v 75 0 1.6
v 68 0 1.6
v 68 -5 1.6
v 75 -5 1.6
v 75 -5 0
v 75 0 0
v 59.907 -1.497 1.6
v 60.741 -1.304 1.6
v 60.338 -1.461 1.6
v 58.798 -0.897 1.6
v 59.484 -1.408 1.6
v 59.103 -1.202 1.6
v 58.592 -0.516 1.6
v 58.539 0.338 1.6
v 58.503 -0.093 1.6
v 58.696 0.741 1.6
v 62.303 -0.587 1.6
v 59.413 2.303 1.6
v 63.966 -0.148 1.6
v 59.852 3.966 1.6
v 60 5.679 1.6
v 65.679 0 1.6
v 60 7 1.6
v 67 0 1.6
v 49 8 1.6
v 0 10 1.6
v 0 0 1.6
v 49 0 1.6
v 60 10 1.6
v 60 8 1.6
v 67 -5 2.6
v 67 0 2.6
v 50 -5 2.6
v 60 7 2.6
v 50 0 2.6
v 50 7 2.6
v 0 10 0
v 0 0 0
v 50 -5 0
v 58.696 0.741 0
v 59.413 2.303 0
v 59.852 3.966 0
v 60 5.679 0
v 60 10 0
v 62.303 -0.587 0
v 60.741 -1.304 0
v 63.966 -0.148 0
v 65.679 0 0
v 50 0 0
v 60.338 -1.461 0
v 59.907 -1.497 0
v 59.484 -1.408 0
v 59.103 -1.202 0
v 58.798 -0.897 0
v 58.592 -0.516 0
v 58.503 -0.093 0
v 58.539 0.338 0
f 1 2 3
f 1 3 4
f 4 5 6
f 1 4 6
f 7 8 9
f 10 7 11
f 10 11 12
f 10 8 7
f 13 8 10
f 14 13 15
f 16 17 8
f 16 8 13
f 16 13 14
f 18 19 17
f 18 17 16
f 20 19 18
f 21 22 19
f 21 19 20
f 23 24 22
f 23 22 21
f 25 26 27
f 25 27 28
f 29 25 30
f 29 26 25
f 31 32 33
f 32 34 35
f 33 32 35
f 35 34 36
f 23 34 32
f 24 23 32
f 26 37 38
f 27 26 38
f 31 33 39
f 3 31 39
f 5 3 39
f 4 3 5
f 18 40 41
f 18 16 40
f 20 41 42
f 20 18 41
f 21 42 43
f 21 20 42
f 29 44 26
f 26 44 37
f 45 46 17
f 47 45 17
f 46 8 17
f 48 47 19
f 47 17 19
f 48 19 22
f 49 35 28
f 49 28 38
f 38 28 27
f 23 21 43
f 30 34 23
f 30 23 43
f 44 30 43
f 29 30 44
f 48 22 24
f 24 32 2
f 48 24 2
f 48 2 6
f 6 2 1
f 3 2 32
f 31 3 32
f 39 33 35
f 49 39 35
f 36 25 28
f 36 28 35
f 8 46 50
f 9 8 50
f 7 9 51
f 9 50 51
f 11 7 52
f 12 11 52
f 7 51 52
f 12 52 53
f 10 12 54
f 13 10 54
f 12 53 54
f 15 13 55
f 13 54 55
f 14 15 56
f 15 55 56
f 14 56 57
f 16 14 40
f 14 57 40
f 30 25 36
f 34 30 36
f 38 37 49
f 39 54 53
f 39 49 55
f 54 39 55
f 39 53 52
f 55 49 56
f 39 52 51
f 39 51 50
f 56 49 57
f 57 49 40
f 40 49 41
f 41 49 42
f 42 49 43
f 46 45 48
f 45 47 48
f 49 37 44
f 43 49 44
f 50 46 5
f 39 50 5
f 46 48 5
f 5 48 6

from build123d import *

# Parameters (mm, degrees)
RESSALTO_EXTRUS_O1_DEPTH = 1.6
RESSALTO_EXTRUS_O2_DEPTH = 1
CHANFRO1_SIZE            = 1
FILETE1_R                = 10


with BuildPart() as part:
    # Esboço1 → Ressalto-extrusão1 (new body)
    with BuildSketch(Plane.XY):
        with BuildLine():
            Line((0, 0), (50, 0))
            Line((50, 0), (50, -5))
            Line((50, -5), (75, -5))
            Line((75, -5), (75, 0))
            Line((75, 0), (61.5, 0))
            ThreePointArc((61.5, 0), (58.939339828, -1.060660172), (60, 1.5))
            Line((60, 1.5), (60, 10))
            Line((60, 10), (0, 10))
            Line((0, 10), (0, 0))
        make_face()
    extrude(amount=RESSALTO_EXTRUS_O1_DEPTH)

    # Esboço2 → Ressalto-extrusão2 (add)
    with BuildSketch(Plane.XY.offset(1.6)):
        Polygon((60, 7), (67, 0), (67, -5), (50, -5), (50, 7), align=None)
    extrude(amount=RESSALTO_EXTRUS_O2_DEPTH)

    # Chanfro1
    # the kernel refuses this chamfer: 1 mm, written as the material it adds along each edge
    with BuildSketch(Plane(origin=(50, 7, 1.6), x_dir=(0, 0.9996219169112968, -0.02749587661058627), z_dir=(1, 0, 0))) as chanfro1_piece_1_section:
        Polygon((CHANFRO1_SIZE * 0.999621916911, CHANFRO1_SIZE * 0.0274958766106), (-CHANFRO1_SIZE * 0.0274958766106, CHANFRO1_SIZE * 0.999621916911), (0, 0), align=None)
    chanfro1_piece_1 = extrude(amount=10, mode=Mode.PRIVATE)
    chanfro1_piece_1 = split(chanfro1_piece_1, bisect_by=Plane(origin=(57.256943657, 9.743056343, 1.932086514), z_dir=(-0.7071067811865478, -0.7071067811865474, 0)), keep=Keep.TOP, mode=Mode.PRIVATE)
    chanfro1_piece_1 = split(chanfro1_piece_1, bisect_by=Plane(origin=(54.837757031, 7.323869717, 2.6), z_dir=(0, 0, -1)), keep=Keep.TOP, mode=Mode.PRIVATE)
    add(chanfro1_piece_1)
    with BuildSketch(Plane(origin=(50, 7, 1.6), x_dir=(0, 0.9996219169112968, -0.02749587661058627), z_dir=(1, 0, 0))) as chanfro1_piece_2_section:
        Polygon((CHANFRO1_SIZE * 0.999621916911, CHANFRO1_SIZE * 0.0274958766106), (-CHANFRO1_SIZE * 0.0274958766106, CHANFRO1_SIZE * 0.999621916911), (0, 0), align=None)
    chanfro1_piece_2 = extrude(amount=10, mode=Mode.PRIVATE)
    chanfro1_piece_2 = split(chanfro1_piece_2, bisect_by=Plane(origin=(59.609036426, 7.390963574, 1.827791028), z_dir=(0.7071067811865478, 0.7071067811865474, 0)), keep=Keep.TOP, mode=Mode.PRIVATE)
    add(chanfro1_piece_2)
    with BuildSketch(Plane(origin=(50, 0, 1.6), x_dir=(-0.9996219169112968, 0, -0.0274958766105862), z_dir=(0, 1, 0))) as chanfro1_piece_3_section:
        Polygon((CHANFRO1_SIZE * 0.999621916911, CHANFRO1_SIZE * 0.0274958766106), (-CHANFRO1_SIZE * 0.0274958766106, CHANFRO1_SIZE * 0.999621916911), (0, 0), align=None)
    chanfro1_piece_3 = extrude(amount=7, mode=Mode.PRIVATE)
    chanfro1_piece_3 = split(chanfro1_piece_3, bisect_by=Plane(origin=(49.669595846, 3.5, 2.6), z_dir=(0, 0, -1)), keep=Keep.TOP, mode=Mode.PRIVATE)
    add(chanfro1_piece_3)
    with BuildSketch(Plane(origin=(67, 0, 1.6), x_dir=(0.9996219169112968, 0, -0.02749587661058639), z_dir=(0, -1, 0))) as chanfro1_piece_4_section:
        Polygon((CHANFRO1_SIZE * 0.999621916911, CHANFRO1_SIZE * 0.0274958766106), (-CHANFRO1_SIZE * 0.0274958766106, CHANFRO1_SIZE * 0.999621916911), (0, 0), align=None)
    chanfro1_piece_4 = extrude(amount=5, mode=Mode.PRIVATE)
    chanfro1_piece_4 = split(chanfro1_piece_4, bisect_by=Plane(origin=(67.390963574, -0.390963574, 1.827791028), z_dir=(0.7071067811865478, 0.7071067811865474, 0)), keep=Keep.TOP, mode=Mode.PRIVATE)
    add(chanfro1_piece_4)
    with BuildSketch(Plane(origin=(67, 0, 1.6), x_dir=(0.9996219169112968, 0, -0.02749587661058639), z_dir=(0, -1, 0))) as chanfro1_piece_5_section:
        Polygon((CHANFRO1_SIZE * 0.999621916911, CHANFRO1_SIZE * 0.0274958766106), (-CHANFRO1_SIZE * 0.0274958766106, CHANFRO1_SIZE * 0.999621916911), (0, 0), align=None)
    chanfro1_piece_5 = extrude(amount=5, mode=Mode.PRIVATE)
    chanfro1_piece_5 = split(chanfro1_piece_5, bisect_by=Plane(origin=(67.316872032, -2.658755048, 2.6), z_dir=(0, 0, -1)), keep=Keep.TOP, mode=Mode.PRIVATE)
    chanfro1_piece_5 = split(chanfro1_piece_5, bisect_by=Plane(origin=(68.48781354, -1.48781354, 1.93578343), z_dir=(-0.7071067811865478, -0.7071067811865474, 0)), keep=Keep.TOP, mode=Mode.PRIVATE)
    add(chanfro1_piece_5)
    with BuildSketch(Plane(origin=(47.428317012, 7, 1.6), x_dir=(0, 0.9996219169112968, -0.02749587661058627), z_dir=(1, 0, 0))) as chanfro1_piece_6a_section:
        Polygon((CHANFRO1_SIZE * 0.999621916911, CHANFRO1_SIZE * 0.0274958766106), (-CHANFRO1_SIZE * 0.0274958766106, CHANFRO1_SIZE * 0.999621916911), (0, 0), align=None)
    chanfro1_piece_6a = extrude(amount=12.571682988, mode=Mode.PRIVATE)
    chanfro1_piece_6a = split(chanfro1_piece_6a, bisect_by=Plane(origin=(50, 7.330404154, 1.928634334), z_dir=(-1, 0, 0)), keep=Keep.TOP, mode=Mode.PRIVATE)
    chanfro1_piece_6a = split(chanfro1_piece_6a, bisect_by=Plane(origin=(48.714158506, 7.330404154, 2.6), z_dir=(0, 0, -1)), keep=Keep.TOP, mode=Mode.PRIVATE)
    with BuildSketch(Plane(origin=(50, 0, 1.6), x_dir=(-0.9996219169112968, 0, -0.0274958766105862), z_dir=(0, 1, 0))) as chanfro1_piece_6b_section:
        Polygon((CHANFRO1_SIZE * 0.999621916911, CHANFRO1_SIZE * 0.0274958766106), (-CHANFRO1_SIZE * 0.0274958766106, CHANFRO1_SIZE * 0.999621916911), (0, 0), align=None)
    chanfro1_piece_6b = extrude(amount=9.571682988, mode=Mode.PRIVATE)
    chanfro1_piece_6b = split(chanfro1_piece_6b, bisect_by=Plane(origin=(49.669595846, 7, 1.928634334), z_dir=(0, 1, 0)), keep=Keep.TOP, mode=Mode.PRIVATE)
    chanfro1_piece_6b = split(chanfro1_piece_6b, bisect_by=Plane(origin=(49.669595846, 8.285841494, 2.6), z_dir=(0, 0, -1)), keep=Keep.TOP, mode=Mode.PRIVATE)
    chanfro1_piece_6 = chanfro1_piece_6a & chanfro1_piece_6b
    add(chanfro1_piece_6)

    # Filete1
    filete1_edges = [part.edges().sort_by_distance(p)[0] for p in [
        (60, 1.5, 0.8),
        (61.5, 0, 0.8),
    ]]
    fillet(filete1_edges, radius=FILETE1_R)


solid = part.part
